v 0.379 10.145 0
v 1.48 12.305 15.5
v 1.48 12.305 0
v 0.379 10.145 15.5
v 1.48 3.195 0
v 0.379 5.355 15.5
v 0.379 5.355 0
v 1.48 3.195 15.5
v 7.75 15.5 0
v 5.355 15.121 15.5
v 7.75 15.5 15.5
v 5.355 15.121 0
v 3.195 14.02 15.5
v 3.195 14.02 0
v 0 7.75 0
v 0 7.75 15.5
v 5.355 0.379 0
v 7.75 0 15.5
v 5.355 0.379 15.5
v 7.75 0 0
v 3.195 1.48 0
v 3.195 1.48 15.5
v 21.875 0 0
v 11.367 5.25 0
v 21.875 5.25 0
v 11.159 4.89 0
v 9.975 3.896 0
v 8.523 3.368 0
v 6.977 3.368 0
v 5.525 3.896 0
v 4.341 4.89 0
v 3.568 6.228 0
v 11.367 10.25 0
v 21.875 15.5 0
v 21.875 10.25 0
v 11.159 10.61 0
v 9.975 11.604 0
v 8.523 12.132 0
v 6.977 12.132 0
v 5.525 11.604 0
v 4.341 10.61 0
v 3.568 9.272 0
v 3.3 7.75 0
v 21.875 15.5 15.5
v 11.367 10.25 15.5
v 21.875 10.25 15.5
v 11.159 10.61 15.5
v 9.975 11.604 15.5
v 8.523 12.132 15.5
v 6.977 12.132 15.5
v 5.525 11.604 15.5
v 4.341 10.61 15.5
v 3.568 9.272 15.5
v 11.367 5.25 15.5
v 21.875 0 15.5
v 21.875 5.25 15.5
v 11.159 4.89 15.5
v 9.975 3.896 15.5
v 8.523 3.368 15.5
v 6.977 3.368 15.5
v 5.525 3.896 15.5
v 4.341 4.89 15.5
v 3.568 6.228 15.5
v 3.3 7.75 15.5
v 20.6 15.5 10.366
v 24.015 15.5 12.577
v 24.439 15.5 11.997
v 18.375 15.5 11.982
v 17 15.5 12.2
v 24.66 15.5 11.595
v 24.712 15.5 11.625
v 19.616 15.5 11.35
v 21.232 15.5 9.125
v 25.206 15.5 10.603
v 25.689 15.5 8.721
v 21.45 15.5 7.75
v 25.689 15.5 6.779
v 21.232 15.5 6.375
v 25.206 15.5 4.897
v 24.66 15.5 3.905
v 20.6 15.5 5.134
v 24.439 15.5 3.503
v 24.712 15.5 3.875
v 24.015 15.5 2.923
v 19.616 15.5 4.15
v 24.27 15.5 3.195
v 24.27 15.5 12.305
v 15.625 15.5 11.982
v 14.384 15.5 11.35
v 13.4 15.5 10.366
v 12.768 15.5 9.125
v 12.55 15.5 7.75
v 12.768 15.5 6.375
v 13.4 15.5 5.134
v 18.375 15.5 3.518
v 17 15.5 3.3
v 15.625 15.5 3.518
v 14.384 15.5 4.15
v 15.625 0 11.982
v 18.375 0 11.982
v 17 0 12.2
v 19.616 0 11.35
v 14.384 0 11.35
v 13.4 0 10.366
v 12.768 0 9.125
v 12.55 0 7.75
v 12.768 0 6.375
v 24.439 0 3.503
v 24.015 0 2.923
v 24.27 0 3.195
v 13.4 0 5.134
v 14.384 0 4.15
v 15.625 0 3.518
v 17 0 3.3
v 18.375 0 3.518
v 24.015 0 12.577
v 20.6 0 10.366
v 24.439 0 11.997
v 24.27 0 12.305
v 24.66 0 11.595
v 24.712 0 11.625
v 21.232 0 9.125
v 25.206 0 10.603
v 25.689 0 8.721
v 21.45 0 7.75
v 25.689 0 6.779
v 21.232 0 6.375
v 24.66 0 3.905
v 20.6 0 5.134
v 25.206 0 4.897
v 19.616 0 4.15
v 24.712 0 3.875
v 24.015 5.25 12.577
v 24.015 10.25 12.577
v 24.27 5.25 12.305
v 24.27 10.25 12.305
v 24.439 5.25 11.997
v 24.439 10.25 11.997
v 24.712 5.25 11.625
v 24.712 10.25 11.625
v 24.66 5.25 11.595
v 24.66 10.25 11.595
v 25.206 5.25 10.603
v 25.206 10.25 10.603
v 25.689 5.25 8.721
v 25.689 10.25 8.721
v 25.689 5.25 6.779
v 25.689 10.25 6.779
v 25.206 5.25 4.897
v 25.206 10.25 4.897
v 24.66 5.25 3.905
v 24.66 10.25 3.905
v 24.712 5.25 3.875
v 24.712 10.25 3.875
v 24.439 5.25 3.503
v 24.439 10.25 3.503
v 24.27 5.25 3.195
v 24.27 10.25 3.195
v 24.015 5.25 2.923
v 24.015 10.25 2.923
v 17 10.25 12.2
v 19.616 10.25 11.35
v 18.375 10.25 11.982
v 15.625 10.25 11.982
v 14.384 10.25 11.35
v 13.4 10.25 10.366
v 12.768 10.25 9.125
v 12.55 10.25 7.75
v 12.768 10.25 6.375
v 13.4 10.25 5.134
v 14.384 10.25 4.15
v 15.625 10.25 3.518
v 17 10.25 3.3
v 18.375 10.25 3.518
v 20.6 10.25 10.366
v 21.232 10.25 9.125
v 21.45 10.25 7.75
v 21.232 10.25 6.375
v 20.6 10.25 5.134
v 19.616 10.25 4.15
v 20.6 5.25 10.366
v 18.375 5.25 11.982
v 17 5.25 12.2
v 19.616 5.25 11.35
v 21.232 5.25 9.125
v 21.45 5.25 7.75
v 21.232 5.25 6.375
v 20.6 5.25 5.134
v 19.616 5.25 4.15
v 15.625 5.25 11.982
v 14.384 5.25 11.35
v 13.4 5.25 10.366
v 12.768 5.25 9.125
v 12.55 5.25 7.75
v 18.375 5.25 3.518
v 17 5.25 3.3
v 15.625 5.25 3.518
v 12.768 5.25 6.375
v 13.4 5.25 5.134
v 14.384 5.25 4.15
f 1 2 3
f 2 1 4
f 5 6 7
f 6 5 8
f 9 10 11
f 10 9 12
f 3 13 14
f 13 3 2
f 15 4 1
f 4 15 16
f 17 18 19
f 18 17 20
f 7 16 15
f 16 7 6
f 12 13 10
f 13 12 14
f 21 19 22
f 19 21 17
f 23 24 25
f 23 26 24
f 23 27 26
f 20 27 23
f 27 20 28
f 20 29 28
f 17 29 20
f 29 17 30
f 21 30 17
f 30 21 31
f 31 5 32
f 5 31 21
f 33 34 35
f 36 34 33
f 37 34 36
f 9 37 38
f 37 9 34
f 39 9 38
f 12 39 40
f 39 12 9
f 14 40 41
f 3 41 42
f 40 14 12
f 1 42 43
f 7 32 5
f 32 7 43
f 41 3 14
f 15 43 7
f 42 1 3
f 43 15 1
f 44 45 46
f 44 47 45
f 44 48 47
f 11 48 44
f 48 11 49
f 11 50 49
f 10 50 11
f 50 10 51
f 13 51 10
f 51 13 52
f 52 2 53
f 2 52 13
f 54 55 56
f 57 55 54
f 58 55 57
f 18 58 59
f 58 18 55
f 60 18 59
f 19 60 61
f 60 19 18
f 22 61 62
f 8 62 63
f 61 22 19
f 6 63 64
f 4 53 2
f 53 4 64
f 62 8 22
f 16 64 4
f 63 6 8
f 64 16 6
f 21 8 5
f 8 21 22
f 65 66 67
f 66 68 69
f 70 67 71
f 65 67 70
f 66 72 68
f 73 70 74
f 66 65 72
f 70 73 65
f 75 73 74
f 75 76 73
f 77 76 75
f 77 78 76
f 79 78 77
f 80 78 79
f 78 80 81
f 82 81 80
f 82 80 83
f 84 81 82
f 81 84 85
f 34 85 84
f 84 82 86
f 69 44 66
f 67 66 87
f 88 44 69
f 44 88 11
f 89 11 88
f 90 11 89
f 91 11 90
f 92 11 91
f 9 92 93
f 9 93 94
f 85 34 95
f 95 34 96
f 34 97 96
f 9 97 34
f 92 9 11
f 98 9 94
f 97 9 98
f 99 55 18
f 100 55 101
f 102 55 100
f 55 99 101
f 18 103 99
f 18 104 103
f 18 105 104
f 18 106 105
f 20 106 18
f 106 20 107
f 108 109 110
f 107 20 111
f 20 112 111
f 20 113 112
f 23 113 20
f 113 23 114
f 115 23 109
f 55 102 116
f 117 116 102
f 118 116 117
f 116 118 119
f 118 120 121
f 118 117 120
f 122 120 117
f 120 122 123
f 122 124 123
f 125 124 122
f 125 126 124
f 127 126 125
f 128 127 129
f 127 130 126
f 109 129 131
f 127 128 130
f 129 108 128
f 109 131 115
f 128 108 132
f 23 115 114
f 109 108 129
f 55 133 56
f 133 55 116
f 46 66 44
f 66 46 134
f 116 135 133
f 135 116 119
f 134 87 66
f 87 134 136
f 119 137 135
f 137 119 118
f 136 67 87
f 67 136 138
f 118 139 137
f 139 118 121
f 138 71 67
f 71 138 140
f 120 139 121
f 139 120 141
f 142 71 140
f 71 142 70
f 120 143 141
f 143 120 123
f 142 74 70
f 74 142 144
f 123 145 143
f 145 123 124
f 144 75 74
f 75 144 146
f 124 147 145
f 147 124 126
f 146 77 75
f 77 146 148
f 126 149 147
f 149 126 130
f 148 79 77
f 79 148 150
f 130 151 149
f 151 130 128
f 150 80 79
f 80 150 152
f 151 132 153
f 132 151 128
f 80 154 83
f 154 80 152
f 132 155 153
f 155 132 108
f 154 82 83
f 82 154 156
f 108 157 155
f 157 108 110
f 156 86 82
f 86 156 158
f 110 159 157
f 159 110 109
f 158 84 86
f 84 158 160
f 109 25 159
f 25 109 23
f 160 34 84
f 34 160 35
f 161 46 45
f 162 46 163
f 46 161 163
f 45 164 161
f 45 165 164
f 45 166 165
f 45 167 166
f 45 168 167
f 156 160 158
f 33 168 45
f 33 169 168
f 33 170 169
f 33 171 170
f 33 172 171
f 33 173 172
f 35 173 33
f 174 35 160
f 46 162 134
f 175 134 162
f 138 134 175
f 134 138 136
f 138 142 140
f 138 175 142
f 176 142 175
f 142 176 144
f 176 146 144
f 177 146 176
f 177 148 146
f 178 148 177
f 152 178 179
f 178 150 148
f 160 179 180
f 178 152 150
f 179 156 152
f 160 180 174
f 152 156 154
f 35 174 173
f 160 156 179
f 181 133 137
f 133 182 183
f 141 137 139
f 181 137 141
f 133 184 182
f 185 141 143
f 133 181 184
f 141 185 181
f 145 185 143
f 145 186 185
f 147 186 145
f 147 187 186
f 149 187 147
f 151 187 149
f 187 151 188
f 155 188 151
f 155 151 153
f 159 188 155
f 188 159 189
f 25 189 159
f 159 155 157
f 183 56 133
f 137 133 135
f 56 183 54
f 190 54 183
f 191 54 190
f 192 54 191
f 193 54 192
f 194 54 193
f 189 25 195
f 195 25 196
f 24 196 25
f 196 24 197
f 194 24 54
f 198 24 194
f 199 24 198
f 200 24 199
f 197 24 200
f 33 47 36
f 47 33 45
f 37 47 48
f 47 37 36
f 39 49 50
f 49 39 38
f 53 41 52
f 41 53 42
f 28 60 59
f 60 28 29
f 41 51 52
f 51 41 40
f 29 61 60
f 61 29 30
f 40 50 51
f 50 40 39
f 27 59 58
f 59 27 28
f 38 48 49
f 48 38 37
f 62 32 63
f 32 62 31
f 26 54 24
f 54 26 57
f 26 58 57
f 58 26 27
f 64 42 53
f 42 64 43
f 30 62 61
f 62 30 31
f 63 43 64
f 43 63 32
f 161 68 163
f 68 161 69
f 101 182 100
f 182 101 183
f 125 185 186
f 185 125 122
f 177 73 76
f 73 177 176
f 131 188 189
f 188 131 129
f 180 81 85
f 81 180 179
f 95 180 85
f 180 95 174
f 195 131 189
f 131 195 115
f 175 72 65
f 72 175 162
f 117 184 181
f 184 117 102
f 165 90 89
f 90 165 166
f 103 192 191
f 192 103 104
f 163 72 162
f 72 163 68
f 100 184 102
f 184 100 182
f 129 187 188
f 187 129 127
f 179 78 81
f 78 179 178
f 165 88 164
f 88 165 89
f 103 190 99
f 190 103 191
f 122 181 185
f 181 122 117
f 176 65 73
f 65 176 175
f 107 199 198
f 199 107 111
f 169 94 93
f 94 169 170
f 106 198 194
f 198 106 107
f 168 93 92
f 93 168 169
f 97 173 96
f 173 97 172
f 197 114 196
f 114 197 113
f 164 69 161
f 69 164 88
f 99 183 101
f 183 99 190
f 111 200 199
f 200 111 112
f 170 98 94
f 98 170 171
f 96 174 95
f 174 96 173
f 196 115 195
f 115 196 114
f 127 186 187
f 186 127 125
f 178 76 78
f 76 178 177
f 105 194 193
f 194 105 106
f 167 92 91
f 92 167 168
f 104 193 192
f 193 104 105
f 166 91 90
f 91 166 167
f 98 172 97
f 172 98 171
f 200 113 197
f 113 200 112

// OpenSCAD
// file: teardrop.scad
teardrop();

module teardrop (r=4.5,h=20,top_and_bottom=false)
{
	rotate([-270,0,90])
	linear_extrude(height=h,convexity=10)
	{
		circle(r=r);
		polygon(points=[[0,0],[r*cos(30),r*sin(30)],[0.5*r,r],[-0.5*r,r],[-r*cos(30),r*sin(30)]],
				paths=[[0,1,2,3,4]]);
		if (top_and_bottom)
		polygon(points=[[0,0],[r*cos(30),-r*sin(30)],[0.5*r,-r],[-0.5*r,-r],[-r*cos(30),-r*sin(30)]],
				paths=[[0,1,2,3,4]]);
		
	}
}

module teardropcentering (r=4.5,h=20)
{
	rotate([-270,0,90])
	linear_extrude(height=h)
	{
		circle(r=r, $fn = 24);
		polygon(points=[[0,0],[r*cos(30),r*sin(30)],[0.5*r,1.2*r],[-0.5*r,1.2*r],[-r*cos(30),r*sin(30)]],
				paths=[[0,1,2,3,4]]);
	}
}

module teardropcentering2 (r=4.5,h=20)
{
	//rotate([-270,0,90])
	difference(){
	linear_extrude(height=h)
	{
		circle(r=r, $fn = 24);
		polygon(points=[[0,0],[r*cos(30),r*sin(30)],[0.5*r,1.2*r],[-0.5*r,1.2*r],[-r*cos(30),r*sin(30)]],
				paths=[[0,1,2,3,4]]);
	}
	translate(v = [-1.5*r, -1.5*r,-1])cube(size =[3*r,1.5*r,h+2]);
	}
}
// file: metric.scad
// PRUSA Mendel  
// Default metric sizes
// GNU GPL v2
// Josef Průša
// josefprusa@me.com
// prusadjs.cz
// http://www.reprap.org/wiki/Prusa_Mendel
// http://github.com/prusajr/PrusaMendel

// RODS

threaded_rod_diameter      = 8.2;
smooth_bar_diameter        = 8;

// Nuts and bolts
// For all nuttraps and screw holse 
m8_diameter                = 8.9;
m8_nut_diameter            = 15.3;
m8_nut_wallDist            = _wallDistFromDia(m8_nut_diameter);
m8_nut_heigth              = 6.3;

m4_diameter                = 4.5;
m4_nut_diameter            = 8.1;
m4_nut_heigth              = 3.2;

m3_diameter                = 3.6;
m3_nut_diameter            = 6.45;
m3_nut_heigth              = 2.3;
m3_nut_wallDist            = _wallDistFromDia(m3_nut_diameter);
m3_nut_diameter_horizontal = 6.1;

// elongetaed nuttraps
// where a nut is put in an slot and inthere hits the perpendicular threadhole
m3_elongNtt_tolerance      = [0.5,0,0.5];// additional [diameter,depth,height]  // depth is not implemented

// linear Bearings
lber_length                = 24;
lber_diam                  = 15.3;

// Motors

motor_shaft                = 5.5;


/******************************************************************************/ 
/*                                  INTERNAL                                  */
/******************************************************************************/
/*-----------------!!! do not change things below this !!!--------------------*/
m3_elongNtt_diameter = m3_nut_diameter + m3_elongNtt_tolerance[0];
m3_elongNtt_wallDist = _wallDistFromDia(m3_elongNtt_diameter);
m3_elongNtt_height = m3_nut_heigth + m3_elongNtt_tolerance[2];



function _wallDistFromDia(dia) = cos(30)*dia;
// main file
// PRUSA Mendel  
// Bar clamp
// Used for joining 8mm rods
// GNU GPL v2
// Josef Průša
// josefprusa@me.com
// prusadjs.cz
// http://www.reprap.org/wiki/Prusa_Mendel
// http://github.com/prusajr/PrusaMendel

include <metric.scad>
use <teardrop.scad>

/**
 * @name Bar clamp
 * @category Printed
 * @using 2 m8nut
 * @using 2 m8washer
 */ 

module barclamp()
{
	outer_radius=m8_diameter/2+3.3;
	clamp_length=17.5;
	clamp_height=2*outer_radius;
	slot_width=5;

	difference()
	{
		union()
		{			
			translate([outer_radius, outer_radius, 0])
			cylinder(h=outer_radius*2,r=outer_radius, $fn = 20);

			translate([outer_radius, 0, 0])
			cube([clamp_length-outer_radius,outer_radius*2,clamp_height]);

			rotate(90)
			translate([0,-18,outer_radius])
			teardrop(r=outer_radius,h=clamp_height,top_and_bottom=true);
		}
	
		translate([outer_radius,outer_radius-slot_width/2,-1])
		cube([clamp_length+1,slot_width,clamp_height+2]);

		translate([outer_radius, outer_radius,-1]) 
		#cylinder(h=clamp_height+2,r=m8_diameter/2,$fn=18);

		translate([17,outer_radius*2+1,outer_radius]) rotate([90,0,0]) 
		#cylinder(h=outer_radius*2+2,r=m8_diameter/2,$fn=20);
	}
}

barclamp();
